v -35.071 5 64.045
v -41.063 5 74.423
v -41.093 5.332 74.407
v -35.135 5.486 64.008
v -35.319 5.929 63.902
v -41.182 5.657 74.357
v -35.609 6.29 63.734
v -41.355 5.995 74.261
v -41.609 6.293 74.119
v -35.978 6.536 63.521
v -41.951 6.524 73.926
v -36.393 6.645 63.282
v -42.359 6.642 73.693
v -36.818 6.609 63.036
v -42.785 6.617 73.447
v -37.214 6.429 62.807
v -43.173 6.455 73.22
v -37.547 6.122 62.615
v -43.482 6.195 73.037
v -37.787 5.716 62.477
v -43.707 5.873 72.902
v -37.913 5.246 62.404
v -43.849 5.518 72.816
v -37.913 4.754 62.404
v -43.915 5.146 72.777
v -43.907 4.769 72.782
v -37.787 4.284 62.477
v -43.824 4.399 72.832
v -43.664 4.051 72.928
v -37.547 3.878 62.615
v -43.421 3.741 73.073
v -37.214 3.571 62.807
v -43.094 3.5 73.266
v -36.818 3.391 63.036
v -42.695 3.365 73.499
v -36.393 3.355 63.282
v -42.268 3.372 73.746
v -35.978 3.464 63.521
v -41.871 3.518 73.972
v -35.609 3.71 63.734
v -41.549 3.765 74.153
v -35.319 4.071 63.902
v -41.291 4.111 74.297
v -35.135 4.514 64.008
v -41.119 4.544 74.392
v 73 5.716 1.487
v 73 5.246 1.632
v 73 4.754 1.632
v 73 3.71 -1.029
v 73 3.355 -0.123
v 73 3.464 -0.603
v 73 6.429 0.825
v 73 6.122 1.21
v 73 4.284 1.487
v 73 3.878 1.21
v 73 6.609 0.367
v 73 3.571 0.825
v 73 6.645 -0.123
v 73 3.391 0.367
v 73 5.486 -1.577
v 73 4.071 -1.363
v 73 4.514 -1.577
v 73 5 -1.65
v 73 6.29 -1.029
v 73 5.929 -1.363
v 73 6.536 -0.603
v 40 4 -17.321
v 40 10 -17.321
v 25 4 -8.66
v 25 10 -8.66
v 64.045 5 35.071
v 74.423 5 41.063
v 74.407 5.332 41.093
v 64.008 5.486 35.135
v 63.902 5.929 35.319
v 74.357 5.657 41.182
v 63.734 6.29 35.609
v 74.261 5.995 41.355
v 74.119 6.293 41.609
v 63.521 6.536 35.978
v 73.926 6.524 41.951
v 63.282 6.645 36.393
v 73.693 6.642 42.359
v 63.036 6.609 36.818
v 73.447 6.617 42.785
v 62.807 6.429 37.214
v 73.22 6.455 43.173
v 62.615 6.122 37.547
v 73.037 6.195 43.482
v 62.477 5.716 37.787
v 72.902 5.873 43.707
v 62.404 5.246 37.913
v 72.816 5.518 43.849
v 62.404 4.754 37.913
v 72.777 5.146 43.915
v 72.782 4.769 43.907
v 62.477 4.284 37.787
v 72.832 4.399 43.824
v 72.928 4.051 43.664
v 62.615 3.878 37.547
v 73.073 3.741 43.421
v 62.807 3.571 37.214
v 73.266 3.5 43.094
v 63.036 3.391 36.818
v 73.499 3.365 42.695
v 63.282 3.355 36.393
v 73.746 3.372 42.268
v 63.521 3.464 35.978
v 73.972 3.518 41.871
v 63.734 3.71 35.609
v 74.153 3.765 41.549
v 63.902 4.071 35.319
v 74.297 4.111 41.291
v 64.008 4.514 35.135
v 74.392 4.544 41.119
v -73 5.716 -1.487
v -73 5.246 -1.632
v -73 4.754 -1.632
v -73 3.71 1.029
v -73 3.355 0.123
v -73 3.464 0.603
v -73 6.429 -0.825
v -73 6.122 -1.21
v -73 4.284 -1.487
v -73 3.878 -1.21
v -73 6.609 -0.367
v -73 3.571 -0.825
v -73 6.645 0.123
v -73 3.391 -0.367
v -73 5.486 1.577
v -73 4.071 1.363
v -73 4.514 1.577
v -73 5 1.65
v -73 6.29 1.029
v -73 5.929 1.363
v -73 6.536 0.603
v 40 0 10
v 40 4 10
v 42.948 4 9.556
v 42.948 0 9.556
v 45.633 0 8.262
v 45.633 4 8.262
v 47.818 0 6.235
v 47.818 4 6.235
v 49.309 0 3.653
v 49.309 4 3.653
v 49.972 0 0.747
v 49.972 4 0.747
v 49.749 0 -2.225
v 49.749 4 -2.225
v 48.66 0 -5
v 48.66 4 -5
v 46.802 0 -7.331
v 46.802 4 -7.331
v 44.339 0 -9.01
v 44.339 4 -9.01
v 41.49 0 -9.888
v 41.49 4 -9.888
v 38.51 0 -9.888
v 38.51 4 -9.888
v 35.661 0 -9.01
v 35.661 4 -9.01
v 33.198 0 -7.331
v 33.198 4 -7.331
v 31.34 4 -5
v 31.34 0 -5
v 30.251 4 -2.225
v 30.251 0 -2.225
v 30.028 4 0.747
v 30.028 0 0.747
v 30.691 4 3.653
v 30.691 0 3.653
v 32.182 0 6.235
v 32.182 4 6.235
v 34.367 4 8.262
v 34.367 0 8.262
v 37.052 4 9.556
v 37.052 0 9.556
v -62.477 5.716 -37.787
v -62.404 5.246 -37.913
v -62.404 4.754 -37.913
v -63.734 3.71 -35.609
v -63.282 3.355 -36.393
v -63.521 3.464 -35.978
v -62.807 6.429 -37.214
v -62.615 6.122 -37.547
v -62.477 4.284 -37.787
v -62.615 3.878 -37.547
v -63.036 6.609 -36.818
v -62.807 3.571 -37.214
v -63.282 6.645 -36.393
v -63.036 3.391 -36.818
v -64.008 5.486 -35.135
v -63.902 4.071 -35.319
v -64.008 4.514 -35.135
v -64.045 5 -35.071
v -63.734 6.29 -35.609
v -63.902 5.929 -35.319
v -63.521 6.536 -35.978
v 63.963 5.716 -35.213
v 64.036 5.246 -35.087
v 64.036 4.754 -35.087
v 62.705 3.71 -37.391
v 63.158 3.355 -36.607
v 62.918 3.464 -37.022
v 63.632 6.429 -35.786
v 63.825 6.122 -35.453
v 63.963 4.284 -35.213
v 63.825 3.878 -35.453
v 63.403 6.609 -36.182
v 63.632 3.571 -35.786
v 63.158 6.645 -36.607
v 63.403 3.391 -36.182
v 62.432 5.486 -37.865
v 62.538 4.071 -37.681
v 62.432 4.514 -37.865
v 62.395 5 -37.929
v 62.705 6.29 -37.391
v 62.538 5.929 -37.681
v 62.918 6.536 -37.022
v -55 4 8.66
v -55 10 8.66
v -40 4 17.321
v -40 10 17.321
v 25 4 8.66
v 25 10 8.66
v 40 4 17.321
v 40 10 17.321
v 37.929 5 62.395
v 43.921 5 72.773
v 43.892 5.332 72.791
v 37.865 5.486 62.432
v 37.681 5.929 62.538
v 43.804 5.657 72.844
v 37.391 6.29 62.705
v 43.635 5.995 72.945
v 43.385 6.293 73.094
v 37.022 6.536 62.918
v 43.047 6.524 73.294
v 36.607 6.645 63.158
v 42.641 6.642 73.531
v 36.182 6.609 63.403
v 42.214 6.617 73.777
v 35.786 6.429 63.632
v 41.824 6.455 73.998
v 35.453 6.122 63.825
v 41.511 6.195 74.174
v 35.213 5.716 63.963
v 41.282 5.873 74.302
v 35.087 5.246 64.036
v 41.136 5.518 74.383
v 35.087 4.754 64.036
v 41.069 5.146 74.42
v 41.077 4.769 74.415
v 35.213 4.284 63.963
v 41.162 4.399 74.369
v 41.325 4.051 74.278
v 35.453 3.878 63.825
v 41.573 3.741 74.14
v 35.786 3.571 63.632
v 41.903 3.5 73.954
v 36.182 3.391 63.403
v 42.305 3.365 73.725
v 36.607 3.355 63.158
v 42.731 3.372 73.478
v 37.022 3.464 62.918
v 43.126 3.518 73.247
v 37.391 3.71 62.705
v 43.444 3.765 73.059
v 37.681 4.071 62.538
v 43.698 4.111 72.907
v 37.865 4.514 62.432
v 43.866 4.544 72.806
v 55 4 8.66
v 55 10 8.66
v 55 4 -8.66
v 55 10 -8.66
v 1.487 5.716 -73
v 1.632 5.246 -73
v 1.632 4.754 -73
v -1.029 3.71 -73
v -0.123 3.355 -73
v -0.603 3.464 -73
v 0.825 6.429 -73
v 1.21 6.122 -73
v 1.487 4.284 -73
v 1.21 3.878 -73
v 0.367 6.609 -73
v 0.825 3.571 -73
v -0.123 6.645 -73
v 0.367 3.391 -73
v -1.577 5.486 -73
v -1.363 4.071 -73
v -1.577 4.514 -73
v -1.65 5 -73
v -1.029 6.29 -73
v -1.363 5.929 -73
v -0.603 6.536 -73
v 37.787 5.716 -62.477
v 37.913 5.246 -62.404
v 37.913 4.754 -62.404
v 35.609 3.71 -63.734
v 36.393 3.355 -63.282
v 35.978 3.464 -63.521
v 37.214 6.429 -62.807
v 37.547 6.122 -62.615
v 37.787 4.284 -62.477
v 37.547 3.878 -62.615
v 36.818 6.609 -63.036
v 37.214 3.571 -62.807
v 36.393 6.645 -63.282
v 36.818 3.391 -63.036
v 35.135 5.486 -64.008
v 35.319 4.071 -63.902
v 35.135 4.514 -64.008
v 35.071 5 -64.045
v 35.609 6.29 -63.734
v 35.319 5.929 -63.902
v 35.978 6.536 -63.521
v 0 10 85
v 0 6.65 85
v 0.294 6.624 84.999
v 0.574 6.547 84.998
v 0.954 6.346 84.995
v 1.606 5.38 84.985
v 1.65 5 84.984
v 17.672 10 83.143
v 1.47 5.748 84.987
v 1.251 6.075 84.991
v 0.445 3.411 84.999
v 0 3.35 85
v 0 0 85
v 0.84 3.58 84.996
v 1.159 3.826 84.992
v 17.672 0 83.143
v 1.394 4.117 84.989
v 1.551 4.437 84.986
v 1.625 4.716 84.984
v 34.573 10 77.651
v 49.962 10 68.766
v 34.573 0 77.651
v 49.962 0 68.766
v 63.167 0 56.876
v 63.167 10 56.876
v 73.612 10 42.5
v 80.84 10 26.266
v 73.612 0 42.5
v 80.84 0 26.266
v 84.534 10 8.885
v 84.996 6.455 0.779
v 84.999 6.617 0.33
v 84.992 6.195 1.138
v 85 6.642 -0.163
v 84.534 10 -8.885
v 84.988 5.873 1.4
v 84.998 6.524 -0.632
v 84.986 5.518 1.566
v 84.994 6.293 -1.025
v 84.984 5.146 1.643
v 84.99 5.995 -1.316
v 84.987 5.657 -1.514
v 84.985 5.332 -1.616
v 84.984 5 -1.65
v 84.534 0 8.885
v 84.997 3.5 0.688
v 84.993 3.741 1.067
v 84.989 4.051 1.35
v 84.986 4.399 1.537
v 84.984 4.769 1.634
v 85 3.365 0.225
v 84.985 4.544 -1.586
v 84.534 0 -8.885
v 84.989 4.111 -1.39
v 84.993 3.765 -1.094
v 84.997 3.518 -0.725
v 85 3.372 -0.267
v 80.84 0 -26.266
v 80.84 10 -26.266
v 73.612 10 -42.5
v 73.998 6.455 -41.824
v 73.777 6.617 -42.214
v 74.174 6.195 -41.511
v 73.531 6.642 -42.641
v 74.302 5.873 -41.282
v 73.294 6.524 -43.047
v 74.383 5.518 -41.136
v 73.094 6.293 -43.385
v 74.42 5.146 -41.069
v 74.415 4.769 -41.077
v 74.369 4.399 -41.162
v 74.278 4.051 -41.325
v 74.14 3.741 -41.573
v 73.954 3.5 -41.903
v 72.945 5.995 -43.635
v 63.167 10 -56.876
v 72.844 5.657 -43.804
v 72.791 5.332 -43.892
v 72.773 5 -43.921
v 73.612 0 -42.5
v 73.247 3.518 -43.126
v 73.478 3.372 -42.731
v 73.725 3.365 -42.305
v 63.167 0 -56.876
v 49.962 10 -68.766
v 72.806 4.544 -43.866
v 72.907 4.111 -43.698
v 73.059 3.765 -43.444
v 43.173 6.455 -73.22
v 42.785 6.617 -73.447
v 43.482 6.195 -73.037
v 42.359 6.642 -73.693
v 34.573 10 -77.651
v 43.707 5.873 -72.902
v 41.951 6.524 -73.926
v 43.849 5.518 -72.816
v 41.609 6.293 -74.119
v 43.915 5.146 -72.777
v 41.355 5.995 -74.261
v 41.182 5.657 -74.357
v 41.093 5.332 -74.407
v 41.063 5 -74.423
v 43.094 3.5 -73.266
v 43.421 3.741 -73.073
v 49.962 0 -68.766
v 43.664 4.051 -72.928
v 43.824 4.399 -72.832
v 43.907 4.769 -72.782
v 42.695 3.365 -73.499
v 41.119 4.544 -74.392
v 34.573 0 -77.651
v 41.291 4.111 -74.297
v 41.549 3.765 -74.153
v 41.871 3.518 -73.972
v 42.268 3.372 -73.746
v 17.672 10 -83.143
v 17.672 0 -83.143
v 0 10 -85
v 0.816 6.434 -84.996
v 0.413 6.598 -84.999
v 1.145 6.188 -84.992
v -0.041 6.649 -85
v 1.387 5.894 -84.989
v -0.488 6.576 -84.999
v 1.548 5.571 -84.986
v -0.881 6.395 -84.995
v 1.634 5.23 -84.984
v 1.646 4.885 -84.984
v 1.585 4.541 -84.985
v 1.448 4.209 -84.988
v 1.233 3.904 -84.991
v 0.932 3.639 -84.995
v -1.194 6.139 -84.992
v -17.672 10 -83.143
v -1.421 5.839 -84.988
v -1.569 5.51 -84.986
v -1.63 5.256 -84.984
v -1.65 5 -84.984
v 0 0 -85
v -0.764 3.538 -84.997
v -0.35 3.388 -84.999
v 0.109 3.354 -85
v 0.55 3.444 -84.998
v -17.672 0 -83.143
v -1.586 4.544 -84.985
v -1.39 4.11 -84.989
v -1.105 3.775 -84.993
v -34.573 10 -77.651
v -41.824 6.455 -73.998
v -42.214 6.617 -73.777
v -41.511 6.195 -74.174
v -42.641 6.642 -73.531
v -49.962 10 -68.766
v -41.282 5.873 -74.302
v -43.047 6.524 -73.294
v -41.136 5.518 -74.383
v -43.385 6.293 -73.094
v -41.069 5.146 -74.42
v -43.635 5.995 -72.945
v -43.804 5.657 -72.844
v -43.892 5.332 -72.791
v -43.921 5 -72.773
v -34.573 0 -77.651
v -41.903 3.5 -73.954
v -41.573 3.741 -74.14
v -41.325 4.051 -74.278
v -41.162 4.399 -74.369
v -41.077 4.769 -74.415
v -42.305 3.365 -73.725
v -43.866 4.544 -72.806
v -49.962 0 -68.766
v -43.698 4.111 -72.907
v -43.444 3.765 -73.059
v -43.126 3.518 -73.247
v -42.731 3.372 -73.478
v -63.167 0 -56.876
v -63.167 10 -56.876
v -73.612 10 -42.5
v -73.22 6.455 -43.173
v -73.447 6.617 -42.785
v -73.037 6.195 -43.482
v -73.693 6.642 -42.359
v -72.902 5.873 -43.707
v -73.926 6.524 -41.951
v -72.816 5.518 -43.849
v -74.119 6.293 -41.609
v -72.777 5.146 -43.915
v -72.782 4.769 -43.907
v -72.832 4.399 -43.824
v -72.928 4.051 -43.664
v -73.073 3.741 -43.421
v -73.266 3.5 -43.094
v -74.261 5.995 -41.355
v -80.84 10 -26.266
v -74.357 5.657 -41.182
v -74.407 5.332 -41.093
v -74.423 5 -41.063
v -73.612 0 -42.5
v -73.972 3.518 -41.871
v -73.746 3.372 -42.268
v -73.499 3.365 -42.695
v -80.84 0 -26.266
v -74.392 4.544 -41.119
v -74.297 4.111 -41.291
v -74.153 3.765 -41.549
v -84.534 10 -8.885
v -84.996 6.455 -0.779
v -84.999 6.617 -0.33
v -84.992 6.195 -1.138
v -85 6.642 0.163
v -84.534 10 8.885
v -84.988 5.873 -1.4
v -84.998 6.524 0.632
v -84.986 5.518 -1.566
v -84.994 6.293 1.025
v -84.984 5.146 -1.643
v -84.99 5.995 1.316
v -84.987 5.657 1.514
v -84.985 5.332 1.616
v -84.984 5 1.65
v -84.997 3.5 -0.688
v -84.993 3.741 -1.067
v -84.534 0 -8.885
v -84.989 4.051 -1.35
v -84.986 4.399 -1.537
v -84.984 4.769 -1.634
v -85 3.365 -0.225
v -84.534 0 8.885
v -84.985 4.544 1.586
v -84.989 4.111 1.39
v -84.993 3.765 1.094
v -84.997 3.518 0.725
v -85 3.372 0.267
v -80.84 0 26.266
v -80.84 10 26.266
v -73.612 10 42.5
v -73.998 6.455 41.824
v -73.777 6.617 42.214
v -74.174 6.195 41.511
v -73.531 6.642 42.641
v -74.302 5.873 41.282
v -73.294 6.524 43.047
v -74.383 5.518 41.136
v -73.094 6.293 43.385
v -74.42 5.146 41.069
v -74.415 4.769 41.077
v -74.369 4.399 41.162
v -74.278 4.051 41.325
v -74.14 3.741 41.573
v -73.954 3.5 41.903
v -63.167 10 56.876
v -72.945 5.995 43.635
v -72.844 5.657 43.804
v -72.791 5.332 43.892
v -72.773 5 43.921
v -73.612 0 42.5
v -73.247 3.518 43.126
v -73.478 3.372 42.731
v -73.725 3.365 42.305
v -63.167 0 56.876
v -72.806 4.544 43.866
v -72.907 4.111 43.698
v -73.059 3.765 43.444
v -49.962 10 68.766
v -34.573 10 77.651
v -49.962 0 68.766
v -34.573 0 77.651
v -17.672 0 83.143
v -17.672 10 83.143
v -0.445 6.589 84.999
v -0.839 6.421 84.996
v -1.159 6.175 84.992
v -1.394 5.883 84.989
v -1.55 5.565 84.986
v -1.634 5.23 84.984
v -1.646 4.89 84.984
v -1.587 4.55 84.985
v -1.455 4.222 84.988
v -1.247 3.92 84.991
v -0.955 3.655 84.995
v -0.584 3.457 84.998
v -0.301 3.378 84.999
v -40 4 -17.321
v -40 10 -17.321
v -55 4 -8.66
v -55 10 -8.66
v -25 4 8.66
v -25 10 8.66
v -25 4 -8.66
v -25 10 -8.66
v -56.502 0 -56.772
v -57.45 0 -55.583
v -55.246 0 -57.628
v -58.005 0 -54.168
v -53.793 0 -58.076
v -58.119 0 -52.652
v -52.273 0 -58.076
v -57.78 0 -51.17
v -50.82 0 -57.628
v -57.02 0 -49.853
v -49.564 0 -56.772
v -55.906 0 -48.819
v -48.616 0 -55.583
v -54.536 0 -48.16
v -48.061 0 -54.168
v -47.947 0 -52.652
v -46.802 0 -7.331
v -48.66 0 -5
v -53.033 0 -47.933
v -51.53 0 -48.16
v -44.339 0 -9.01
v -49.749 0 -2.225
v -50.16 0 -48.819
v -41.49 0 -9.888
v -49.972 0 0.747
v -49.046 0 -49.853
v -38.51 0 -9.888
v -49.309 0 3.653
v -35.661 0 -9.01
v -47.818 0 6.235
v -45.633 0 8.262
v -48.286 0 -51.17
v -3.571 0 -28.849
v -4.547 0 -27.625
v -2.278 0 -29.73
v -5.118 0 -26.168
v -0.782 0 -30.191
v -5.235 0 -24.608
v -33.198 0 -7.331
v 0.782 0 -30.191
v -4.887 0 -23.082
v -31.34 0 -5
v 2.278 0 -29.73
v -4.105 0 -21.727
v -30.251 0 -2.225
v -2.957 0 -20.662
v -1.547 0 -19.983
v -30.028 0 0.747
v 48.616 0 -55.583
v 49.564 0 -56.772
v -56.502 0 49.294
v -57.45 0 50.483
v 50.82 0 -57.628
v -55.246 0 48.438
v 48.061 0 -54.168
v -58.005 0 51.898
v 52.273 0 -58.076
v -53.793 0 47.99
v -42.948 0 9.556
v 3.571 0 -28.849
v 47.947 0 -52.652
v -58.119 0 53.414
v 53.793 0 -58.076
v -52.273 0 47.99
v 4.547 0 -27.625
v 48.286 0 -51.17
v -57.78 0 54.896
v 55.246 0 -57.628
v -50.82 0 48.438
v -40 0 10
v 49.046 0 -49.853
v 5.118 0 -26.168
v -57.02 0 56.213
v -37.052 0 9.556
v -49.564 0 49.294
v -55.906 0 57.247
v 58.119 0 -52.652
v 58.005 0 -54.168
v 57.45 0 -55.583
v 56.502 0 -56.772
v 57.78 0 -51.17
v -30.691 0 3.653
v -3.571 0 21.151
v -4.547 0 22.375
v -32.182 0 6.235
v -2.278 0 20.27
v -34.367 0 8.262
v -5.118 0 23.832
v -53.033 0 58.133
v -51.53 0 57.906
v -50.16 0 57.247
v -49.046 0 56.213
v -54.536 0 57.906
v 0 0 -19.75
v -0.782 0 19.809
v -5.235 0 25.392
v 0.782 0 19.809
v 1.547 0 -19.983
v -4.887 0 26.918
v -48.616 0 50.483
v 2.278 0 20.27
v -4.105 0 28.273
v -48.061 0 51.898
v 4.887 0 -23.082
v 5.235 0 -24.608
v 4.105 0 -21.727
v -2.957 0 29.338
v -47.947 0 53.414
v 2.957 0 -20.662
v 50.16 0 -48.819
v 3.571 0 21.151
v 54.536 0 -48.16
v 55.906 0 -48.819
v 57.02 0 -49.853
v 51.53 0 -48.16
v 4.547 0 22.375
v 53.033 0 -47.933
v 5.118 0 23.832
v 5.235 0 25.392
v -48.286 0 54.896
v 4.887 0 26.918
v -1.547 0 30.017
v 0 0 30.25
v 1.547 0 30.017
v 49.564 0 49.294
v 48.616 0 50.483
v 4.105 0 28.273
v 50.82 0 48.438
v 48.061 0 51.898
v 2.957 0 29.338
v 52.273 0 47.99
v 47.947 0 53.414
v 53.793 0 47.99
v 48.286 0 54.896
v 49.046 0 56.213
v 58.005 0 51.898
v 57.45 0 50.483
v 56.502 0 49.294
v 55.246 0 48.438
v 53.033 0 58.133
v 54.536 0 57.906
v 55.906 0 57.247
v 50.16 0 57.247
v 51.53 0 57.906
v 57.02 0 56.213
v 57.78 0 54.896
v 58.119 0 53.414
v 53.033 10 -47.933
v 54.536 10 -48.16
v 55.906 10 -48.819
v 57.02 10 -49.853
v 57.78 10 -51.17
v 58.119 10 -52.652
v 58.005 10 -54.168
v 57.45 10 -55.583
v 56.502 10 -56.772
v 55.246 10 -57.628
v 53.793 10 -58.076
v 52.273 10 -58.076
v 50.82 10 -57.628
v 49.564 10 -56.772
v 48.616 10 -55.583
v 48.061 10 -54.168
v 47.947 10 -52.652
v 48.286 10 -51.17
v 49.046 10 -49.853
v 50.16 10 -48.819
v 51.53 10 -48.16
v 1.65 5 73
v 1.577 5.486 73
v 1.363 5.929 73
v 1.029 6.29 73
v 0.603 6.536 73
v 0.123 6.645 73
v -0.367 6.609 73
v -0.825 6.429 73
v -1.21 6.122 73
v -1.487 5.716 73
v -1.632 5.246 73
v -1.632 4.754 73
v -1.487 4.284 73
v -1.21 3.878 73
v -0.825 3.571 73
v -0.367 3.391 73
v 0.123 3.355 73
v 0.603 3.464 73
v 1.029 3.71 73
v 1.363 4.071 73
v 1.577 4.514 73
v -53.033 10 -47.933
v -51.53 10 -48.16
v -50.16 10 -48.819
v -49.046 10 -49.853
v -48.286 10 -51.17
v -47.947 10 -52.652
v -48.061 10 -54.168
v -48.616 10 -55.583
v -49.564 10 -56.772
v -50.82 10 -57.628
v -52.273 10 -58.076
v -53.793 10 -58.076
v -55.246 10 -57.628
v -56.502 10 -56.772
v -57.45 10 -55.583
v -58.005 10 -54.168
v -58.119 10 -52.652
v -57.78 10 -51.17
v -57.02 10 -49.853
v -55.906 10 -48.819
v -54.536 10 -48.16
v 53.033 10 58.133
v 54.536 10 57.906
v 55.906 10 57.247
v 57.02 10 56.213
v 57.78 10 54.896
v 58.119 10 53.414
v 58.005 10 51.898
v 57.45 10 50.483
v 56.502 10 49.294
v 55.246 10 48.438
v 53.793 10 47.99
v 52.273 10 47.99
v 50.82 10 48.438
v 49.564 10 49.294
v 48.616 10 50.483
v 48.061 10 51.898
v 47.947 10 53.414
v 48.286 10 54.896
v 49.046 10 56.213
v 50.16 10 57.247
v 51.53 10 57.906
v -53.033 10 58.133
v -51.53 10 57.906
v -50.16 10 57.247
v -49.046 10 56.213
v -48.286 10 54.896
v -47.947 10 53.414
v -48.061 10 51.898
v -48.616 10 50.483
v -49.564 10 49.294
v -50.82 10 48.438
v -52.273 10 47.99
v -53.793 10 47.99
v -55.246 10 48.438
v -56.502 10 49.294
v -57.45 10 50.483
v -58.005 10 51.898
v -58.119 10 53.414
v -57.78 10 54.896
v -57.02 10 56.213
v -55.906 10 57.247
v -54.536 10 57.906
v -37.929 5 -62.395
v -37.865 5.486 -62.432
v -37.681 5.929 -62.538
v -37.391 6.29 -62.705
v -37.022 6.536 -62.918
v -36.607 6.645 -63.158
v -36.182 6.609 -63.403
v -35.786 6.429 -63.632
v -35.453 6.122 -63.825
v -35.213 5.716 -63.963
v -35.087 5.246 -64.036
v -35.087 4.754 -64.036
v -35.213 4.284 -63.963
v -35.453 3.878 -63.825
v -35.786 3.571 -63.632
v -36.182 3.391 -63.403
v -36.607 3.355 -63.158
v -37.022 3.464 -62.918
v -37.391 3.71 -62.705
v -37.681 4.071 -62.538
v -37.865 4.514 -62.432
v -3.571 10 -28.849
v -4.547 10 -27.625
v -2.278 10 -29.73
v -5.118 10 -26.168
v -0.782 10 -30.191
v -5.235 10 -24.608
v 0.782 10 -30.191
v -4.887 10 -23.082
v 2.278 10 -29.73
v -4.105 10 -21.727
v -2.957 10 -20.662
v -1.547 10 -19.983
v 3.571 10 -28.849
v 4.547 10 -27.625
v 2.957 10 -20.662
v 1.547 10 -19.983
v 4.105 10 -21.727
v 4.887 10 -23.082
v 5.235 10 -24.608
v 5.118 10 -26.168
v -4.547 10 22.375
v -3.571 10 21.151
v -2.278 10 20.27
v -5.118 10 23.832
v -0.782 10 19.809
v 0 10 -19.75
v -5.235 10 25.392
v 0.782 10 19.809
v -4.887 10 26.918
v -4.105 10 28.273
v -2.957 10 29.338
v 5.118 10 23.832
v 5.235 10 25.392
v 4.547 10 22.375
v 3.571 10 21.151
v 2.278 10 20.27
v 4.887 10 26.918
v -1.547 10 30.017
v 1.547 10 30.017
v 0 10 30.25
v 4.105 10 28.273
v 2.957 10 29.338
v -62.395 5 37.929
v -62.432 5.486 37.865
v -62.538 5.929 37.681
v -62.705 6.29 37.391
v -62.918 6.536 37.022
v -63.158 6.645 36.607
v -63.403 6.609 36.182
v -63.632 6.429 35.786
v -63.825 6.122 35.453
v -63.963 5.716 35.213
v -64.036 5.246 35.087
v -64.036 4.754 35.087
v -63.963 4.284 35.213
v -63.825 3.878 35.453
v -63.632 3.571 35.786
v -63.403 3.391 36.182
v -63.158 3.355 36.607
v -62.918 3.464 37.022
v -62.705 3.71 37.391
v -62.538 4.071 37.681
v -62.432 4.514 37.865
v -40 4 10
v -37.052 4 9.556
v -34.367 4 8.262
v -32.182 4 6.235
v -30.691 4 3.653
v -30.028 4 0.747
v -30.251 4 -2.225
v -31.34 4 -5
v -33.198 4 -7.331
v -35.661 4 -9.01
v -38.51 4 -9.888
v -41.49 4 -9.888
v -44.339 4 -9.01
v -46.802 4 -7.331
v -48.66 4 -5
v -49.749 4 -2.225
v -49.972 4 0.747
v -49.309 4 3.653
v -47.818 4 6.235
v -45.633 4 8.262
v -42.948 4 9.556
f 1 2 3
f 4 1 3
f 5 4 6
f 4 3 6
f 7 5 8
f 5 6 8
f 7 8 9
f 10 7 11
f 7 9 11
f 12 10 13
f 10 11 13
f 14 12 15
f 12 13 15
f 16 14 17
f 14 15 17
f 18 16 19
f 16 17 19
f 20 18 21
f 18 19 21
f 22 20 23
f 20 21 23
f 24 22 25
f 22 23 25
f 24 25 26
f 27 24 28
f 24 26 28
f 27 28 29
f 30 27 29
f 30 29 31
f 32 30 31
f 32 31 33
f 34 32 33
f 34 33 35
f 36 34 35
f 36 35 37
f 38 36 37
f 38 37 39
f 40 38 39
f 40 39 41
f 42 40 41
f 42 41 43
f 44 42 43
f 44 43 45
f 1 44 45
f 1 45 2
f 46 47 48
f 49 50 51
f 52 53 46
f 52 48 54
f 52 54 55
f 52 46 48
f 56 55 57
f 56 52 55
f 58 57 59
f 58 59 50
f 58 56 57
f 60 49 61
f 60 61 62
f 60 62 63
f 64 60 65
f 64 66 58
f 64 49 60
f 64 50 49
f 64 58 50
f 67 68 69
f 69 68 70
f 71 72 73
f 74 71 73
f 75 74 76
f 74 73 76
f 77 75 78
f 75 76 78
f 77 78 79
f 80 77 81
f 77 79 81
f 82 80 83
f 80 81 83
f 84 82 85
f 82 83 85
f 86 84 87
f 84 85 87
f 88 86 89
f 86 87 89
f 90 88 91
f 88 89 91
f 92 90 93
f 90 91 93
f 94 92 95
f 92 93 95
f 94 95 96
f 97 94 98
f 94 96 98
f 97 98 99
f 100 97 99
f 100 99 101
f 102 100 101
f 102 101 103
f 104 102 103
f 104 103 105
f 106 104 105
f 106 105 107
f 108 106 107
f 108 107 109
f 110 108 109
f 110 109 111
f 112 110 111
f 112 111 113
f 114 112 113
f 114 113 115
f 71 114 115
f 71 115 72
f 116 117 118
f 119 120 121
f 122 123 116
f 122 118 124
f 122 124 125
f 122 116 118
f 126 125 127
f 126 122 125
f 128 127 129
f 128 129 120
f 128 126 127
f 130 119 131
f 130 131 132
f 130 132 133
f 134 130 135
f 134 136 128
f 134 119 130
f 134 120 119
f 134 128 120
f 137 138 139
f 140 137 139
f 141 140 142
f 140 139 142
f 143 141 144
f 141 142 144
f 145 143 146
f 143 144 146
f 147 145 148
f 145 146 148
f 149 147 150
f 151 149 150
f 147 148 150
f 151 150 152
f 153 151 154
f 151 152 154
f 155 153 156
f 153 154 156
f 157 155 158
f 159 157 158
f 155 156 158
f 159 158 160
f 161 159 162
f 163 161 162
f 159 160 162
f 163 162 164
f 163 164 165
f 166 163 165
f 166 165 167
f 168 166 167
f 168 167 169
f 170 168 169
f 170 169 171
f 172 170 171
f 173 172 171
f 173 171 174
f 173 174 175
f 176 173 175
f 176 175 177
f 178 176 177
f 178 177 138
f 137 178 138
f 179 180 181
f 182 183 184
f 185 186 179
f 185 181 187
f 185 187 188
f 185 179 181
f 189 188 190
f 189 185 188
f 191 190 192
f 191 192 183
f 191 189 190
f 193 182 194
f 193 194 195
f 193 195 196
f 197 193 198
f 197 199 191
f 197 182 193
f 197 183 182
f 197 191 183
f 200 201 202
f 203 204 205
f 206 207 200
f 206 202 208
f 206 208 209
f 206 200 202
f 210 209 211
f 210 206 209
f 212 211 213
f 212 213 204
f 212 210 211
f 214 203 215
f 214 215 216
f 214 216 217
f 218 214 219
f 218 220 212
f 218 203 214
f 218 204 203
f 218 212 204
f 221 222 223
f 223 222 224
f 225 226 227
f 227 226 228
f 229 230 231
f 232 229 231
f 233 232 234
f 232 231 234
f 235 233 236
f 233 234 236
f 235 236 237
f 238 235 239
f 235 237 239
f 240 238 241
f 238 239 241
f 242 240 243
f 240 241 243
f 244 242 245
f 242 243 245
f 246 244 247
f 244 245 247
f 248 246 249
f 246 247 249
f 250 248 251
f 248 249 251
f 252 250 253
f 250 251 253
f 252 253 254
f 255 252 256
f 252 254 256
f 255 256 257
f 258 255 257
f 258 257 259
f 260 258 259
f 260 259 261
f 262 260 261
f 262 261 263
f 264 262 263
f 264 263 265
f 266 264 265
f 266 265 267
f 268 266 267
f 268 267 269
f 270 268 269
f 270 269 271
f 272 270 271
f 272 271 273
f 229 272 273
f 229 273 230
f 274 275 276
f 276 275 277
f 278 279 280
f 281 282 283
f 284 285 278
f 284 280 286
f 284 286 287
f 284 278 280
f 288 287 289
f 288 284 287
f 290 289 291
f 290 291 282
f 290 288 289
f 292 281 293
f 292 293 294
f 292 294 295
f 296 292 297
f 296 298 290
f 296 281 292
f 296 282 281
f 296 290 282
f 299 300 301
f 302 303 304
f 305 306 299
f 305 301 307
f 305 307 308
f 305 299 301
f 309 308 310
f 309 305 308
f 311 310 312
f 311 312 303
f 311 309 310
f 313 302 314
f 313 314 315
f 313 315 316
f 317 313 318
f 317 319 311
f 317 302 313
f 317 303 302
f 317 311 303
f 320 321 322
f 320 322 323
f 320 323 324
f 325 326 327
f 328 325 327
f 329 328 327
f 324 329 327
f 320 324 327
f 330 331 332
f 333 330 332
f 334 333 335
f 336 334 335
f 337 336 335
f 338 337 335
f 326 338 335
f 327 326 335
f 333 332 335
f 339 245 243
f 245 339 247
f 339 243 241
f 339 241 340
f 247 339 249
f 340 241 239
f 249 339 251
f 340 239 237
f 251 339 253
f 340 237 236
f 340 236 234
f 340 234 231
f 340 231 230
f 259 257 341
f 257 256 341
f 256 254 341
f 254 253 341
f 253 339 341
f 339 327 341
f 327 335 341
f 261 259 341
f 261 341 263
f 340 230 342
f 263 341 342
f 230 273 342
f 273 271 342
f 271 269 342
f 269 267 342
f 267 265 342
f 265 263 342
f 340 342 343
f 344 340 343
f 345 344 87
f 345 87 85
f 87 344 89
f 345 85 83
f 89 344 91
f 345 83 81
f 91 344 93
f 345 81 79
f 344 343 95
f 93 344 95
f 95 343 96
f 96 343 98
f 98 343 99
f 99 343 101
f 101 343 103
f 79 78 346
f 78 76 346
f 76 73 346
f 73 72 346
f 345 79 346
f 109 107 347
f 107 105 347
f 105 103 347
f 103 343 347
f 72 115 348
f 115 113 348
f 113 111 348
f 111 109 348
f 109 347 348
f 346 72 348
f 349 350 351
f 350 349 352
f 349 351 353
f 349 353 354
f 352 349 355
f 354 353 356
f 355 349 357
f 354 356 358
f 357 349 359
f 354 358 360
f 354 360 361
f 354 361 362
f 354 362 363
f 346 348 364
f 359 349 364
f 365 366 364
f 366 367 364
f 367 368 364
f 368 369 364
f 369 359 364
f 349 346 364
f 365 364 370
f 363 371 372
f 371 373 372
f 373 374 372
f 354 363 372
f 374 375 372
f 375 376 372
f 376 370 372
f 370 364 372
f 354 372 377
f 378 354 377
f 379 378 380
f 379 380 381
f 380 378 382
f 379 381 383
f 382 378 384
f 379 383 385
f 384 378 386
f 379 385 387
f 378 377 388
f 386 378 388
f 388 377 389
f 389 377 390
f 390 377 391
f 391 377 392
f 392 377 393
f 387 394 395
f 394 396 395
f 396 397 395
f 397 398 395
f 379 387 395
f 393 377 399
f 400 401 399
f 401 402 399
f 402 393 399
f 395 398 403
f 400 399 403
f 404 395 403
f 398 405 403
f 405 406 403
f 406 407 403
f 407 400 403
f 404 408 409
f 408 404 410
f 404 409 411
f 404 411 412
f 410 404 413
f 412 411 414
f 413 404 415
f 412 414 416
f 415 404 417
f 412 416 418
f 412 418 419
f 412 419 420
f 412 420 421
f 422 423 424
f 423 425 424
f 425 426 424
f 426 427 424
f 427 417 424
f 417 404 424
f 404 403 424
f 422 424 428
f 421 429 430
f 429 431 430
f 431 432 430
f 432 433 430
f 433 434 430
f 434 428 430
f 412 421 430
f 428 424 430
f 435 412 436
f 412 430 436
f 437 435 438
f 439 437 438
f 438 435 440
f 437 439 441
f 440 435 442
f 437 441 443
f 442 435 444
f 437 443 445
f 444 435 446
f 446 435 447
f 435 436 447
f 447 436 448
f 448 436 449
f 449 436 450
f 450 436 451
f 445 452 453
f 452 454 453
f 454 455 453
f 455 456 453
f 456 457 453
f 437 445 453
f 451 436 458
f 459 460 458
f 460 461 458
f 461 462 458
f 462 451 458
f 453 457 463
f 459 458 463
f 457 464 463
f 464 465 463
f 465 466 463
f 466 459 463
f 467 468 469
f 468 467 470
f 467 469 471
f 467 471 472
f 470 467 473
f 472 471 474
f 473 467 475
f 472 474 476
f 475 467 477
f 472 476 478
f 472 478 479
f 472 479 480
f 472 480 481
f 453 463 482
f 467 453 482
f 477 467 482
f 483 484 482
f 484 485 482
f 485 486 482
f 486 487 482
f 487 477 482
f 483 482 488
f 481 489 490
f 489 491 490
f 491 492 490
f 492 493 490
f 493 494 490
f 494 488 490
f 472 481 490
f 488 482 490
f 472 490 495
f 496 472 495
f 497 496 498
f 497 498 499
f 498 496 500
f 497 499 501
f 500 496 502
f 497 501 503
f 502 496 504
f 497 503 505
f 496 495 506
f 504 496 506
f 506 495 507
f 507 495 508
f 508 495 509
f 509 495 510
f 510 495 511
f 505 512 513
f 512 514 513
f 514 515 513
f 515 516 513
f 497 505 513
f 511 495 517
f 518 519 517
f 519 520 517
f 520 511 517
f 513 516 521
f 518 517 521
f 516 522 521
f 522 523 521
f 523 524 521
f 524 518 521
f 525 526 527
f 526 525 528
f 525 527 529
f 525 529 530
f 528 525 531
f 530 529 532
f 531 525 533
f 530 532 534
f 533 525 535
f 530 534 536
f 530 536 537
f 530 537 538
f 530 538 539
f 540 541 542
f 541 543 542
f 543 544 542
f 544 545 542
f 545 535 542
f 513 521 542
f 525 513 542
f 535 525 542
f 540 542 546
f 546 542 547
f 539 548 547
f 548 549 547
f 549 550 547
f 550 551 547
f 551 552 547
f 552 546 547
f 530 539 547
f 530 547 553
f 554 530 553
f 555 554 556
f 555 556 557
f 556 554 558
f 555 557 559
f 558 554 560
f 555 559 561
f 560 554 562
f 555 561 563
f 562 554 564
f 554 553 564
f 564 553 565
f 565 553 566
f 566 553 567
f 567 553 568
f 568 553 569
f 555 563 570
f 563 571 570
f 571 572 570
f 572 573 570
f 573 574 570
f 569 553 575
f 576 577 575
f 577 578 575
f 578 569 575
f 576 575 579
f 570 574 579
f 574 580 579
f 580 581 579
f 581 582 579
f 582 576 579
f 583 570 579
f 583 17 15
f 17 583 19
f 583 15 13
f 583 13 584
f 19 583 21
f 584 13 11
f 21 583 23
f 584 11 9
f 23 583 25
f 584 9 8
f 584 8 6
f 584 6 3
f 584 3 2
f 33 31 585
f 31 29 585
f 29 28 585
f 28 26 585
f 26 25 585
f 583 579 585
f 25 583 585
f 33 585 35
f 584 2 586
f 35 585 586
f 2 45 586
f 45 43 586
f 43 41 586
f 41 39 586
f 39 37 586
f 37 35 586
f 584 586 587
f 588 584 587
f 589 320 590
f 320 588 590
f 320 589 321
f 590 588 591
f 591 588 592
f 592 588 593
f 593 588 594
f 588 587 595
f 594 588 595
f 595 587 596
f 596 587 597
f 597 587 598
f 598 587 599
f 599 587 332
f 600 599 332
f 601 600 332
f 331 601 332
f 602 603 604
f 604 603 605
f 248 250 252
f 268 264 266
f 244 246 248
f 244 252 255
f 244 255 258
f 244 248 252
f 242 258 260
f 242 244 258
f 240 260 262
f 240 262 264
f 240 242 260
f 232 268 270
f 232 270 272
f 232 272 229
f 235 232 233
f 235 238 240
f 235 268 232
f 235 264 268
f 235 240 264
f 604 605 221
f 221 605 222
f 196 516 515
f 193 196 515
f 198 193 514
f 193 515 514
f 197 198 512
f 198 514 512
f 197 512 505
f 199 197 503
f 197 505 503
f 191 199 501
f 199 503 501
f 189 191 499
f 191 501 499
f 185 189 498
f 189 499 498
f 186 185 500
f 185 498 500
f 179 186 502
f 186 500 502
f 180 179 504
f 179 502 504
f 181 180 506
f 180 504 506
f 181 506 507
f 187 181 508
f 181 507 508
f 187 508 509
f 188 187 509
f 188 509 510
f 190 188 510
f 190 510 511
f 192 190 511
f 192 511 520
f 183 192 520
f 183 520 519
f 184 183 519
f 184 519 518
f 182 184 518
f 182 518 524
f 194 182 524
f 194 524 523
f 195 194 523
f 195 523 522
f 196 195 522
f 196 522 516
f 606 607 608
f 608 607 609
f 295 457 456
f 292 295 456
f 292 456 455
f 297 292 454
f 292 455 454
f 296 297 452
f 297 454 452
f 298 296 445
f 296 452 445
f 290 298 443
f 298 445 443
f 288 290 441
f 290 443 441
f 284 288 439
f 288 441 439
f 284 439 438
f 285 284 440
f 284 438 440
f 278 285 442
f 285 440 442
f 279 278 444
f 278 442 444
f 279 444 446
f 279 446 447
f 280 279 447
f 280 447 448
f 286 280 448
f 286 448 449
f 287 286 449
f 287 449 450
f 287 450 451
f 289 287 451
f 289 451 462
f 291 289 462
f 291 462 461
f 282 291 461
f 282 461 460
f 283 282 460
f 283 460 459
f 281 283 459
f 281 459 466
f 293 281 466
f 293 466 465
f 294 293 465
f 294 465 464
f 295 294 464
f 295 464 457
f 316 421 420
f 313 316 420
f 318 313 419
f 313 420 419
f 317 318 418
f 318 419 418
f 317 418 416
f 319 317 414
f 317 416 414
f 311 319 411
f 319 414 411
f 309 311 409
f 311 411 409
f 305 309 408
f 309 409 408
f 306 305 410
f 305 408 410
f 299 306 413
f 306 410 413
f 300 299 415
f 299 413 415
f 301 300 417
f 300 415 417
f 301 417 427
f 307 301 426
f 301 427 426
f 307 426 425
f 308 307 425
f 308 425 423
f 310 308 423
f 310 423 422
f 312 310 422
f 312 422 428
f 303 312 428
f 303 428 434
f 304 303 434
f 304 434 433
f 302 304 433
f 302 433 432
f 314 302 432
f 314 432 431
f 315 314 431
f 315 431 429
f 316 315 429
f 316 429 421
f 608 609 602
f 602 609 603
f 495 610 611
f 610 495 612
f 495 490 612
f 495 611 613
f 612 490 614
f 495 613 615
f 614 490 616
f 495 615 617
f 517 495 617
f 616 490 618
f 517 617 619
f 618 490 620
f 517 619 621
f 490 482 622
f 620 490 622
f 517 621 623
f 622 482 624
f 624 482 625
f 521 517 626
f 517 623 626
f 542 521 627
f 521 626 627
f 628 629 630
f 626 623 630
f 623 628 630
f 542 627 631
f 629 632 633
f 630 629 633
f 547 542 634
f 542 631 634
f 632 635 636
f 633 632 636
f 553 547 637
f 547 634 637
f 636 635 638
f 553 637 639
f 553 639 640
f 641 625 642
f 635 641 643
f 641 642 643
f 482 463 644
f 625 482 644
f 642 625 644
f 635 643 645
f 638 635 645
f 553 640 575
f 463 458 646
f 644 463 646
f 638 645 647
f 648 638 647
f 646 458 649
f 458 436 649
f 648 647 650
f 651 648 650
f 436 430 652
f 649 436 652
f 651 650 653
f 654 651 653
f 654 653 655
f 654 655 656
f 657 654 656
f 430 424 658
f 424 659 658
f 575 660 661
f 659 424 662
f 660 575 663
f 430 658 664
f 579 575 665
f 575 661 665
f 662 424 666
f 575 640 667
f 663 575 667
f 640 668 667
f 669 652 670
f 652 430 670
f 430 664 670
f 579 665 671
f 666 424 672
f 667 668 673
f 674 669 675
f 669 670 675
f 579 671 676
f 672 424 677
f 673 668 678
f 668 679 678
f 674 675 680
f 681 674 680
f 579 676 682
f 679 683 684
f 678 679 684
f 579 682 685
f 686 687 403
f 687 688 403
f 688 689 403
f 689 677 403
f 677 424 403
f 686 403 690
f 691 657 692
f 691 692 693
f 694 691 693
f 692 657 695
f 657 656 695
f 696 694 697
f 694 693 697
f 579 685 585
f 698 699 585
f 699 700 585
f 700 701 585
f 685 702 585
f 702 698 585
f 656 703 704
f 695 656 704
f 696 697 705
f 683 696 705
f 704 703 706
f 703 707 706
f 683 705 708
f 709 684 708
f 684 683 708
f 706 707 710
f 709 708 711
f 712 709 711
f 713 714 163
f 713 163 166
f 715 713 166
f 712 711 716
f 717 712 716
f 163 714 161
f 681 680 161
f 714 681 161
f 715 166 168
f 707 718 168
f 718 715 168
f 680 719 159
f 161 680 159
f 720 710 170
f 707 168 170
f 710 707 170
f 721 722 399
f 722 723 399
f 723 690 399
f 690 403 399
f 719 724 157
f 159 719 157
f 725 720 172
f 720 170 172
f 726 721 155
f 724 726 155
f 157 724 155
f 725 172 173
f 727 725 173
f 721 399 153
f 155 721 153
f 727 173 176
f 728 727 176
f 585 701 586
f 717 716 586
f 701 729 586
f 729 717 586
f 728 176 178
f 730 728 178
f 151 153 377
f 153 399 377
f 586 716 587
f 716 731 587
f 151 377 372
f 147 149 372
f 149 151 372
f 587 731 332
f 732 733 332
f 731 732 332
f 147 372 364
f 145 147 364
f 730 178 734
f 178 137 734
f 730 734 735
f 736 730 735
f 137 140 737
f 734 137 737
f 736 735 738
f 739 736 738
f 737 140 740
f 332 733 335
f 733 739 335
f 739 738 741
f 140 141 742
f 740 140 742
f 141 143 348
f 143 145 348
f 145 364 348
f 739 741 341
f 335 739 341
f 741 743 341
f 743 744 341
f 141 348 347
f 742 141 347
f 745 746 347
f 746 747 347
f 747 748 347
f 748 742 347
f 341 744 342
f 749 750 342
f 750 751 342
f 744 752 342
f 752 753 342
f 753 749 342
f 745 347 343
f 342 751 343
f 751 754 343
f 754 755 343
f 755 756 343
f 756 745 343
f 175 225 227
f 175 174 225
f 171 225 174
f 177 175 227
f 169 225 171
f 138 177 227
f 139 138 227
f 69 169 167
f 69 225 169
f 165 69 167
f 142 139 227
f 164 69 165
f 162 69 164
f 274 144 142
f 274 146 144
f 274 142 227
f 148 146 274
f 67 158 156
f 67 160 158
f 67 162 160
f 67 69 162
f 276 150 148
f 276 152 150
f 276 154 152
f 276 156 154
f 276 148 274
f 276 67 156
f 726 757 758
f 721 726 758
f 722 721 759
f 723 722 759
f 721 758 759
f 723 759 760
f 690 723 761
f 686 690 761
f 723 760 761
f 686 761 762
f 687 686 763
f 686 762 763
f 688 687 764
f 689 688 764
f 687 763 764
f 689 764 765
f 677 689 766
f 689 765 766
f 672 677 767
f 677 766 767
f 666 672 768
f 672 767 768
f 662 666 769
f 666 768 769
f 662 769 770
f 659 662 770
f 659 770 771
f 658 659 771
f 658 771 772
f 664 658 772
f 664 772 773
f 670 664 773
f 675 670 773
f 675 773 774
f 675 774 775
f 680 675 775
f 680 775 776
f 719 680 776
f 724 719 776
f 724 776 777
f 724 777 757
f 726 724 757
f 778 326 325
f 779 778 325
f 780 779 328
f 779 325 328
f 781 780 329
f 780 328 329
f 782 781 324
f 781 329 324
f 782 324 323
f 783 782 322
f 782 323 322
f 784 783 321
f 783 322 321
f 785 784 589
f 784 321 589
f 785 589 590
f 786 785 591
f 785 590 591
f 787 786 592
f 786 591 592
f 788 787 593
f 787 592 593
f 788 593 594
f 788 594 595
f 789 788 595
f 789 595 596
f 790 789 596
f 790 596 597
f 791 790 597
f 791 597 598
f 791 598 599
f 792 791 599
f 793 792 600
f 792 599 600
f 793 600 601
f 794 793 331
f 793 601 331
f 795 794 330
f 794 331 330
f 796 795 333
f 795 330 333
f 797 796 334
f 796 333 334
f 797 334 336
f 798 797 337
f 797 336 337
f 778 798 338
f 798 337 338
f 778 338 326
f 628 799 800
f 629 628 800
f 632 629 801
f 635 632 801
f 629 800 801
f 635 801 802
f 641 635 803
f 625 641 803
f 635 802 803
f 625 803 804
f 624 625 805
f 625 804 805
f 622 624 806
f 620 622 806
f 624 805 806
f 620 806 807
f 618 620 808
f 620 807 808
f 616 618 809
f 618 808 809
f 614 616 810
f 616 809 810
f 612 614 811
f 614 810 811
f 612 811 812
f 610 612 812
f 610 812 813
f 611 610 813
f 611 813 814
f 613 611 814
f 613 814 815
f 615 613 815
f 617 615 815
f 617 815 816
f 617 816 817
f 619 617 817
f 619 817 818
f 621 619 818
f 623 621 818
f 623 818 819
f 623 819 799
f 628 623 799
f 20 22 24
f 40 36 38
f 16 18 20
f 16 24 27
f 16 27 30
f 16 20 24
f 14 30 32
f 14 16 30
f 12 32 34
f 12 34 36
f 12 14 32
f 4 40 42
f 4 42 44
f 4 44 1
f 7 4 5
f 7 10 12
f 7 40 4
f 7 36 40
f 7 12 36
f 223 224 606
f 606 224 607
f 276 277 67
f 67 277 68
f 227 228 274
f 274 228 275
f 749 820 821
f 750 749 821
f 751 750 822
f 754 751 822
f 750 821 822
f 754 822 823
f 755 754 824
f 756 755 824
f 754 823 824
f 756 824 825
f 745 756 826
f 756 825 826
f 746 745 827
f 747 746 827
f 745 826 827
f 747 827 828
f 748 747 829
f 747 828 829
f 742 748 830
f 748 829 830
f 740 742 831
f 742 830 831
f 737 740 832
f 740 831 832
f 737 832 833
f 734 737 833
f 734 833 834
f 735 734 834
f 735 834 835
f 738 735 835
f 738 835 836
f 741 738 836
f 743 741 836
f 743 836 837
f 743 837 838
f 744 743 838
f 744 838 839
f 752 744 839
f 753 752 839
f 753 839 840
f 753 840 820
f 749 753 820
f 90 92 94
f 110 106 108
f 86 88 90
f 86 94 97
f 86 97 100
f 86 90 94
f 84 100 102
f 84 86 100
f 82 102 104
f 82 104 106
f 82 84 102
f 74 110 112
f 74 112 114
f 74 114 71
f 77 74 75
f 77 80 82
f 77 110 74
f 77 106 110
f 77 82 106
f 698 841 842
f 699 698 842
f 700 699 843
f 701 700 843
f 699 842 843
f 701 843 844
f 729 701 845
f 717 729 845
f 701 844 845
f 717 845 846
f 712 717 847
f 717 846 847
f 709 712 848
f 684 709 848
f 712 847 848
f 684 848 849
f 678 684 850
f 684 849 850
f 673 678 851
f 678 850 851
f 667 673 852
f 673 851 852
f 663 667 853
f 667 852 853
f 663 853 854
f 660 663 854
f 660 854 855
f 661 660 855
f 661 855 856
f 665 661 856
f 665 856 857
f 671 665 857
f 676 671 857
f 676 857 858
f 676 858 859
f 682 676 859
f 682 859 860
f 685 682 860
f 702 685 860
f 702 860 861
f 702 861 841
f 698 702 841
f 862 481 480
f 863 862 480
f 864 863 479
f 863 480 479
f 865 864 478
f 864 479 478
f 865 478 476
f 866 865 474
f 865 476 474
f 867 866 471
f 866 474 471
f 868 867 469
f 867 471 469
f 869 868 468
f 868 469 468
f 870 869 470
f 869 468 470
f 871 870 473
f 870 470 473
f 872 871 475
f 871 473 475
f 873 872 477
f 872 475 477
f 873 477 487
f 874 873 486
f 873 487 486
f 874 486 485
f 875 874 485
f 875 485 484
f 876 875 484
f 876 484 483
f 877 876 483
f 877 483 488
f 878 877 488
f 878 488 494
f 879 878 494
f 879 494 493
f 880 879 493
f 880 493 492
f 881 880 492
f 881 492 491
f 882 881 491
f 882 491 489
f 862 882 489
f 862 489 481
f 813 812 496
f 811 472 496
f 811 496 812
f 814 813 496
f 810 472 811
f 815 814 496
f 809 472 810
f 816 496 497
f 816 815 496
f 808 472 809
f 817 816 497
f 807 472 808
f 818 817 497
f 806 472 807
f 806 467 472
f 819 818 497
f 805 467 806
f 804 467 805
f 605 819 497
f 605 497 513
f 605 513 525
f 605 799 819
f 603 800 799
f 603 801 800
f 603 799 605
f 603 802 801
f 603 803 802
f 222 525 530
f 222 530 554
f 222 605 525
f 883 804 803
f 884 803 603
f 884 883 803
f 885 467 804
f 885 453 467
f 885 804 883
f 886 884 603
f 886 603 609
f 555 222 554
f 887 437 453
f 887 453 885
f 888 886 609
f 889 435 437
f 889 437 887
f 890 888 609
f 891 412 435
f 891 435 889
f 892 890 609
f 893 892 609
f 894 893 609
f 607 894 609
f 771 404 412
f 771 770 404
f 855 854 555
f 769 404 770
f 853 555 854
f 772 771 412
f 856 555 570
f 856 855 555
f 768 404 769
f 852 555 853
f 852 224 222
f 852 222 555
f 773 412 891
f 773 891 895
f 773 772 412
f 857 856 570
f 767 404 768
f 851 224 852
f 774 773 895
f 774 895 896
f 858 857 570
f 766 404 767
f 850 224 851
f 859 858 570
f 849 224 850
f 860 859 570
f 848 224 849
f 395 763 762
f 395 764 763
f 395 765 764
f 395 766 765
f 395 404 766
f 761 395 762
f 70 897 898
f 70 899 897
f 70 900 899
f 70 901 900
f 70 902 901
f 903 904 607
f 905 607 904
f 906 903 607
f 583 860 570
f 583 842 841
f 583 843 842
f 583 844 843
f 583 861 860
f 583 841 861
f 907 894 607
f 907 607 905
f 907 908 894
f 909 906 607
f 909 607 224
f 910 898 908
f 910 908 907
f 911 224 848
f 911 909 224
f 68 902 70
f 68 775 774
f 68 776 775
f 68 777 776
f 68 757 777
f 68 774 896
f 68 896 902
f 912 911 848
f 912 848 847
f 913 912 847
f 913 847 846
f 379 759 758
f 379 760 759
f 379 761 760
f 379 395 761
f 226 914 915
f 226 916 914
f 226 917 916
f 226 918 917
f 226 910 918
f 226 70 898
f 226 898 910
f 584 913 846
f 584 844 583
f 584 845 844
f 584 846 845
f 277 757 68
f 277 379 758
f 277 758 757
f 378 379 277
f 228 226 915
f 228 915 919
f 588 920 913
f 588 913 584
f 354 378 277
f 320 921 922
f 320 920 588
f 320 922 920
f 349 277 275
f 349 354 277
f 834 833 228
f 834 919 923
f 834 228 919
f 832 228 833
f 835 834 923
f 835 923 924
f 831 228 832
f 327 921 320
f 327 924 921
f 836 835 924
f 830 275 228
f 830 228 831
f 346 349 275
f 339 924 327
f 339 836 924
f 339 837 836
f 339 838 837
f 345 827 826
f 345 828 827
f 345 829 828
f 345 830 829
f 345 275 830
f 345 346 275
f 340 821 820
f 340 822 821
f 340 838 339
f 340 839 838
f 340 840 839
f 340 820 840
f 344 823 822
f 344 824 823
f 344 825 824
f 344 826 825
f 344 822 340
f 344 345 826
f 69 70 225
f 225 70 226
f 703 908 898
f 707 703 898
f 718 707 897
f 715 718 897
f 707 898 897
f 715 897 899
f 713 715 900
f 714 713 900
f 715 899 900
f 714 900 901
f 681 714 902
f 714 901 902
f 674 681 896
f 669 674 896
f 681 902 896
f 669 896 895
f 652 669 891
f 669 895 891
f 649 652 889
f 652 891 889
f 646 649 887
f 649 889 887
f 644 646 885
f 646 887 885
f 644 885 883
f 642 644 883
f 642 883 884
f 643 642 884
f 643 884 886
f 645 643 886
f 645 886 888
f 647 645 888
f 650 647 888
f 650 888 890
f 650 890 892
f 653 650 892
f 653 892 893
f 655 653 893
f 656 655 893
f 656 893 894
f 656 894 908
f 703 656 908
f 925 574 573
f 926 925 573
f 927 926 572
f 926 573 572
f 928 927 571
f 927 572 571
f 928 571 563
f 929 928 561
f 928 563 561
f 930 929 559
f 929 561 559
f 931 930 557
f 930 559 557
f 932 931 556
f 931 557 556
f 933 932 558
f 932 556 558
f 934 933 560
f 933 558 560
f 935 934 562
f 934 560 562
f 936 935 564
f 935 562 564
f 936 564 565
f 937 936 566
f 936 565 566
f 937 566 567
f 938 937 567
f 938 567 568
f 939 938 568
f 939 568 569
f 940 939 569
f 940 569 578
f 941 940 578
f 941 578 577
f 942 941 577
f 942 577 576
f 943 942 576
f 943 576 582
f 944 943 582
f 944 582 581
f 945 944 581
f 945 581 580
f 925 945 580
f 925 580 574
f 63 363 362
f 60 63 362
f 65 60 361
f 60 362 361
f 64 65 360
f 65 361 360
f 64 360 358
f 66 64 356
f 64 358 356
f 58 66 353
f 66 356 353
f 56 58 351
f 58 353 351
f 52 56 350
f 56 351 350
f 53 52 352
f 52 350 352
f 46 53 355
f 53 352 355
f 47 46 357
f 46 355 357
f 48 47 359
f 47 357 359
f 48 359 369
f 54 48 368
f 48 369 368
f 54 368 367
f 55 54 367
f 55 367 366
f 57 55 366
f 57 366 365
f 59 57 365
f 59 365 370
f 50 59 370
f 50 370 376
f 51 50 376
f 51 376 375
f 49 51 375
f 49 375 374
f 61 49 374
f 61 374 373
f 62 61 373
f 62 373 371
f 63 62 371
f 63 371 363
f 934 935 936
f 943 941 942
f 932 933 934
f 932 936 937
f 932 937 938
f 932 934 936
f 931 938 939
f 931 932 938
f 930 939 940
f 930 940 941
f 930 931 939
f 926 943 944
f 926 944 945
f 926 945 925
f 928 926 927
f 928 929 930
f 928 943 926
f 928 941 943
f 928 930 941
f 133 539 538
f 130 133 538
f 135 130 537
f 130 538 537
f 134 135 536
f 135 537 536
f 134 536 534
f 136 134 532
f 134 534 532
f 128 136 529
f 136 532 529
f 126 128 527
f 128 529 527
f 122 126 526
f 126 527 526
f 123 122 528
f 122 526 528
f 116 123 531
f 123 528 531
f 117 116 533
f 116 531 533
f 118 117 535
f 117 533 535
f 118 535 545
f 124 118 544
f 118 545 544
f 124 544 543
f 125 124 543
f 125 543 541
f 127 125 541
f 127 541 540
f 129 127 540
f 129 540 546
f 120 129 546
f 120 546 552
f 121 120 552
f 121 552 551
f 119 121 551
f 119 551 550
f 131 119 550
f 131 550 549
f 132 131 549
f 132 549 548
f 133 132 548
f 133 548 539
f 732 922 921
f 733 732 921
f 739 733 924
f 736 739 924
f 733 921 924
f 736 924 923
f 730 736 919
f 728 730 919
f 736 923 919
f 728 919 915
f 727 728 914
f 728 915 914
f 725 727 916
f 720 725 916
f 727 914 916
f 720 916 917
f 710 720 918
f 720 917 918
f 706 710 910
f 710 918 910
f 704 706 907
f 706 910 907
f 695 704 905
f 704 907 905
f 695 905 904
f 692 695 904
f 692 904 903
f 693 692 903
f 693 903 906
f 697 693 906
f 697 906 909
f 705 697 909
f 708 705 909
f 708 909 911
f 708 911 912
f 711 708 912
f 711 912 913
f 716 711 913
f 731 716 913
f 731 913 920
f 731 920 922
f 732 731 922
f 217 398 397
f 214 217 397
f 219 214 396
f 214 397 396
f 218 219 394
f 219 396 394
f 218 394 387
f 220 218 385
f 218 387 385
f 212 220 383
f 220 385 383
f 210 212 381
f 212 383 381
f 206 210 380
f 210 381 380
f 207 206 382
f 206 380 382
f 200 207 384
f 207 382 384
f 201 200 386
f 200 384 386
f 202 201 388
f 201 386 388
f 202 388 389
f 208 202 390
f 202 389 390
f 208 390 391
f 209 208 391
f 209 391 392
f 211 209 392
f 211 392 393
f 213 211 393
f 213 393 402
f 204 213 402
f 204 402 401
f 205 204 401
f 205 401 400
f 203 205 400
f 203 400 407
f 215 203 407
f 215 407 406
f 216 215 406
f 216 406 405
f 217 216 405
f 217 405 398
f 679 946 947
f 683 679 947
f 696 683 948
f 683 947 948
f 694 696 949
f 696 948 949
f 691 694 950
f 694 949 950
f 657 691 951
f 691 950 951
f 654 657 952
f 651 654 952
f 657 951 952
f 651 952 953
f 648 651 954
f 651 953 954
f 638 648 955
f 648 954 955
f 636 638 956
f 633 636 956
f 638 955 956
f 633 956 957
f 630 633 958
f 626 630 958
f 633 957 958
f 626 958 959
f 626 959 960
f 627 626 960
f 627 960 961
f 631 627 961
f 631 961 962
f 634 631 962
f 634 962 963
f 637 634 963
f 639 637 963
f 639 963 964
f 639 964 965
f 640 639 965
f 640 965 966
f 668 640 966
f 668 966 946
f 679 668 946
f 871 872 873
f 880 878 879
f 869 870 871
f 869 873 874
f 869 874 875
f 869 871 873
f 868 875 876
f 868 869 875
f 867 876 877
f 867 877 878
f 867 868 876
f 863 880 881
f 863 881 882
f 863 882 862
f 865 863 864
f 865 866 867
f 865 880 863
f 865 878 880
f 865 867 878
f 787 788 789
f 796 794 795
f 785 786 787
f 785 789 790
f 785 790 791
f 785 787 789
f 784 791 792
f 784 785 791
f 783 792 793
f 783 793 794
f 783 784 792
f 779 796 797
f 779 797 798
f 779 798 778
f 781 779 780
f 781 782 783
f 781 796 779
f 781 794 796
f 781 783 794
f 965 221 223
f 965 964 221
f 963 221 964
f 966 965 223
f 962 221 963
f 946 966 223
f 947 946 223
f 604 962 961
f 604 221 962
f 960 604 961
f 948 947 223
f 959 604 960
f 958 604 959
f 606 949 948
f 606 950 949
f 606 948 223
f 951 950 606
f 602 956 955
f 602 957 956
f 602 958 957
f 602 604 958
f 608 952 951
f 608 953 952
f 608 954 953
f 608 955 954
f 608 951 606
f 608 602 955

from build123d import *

# Parameters (mm, degrees)
SZKIC1_R                    = 85
DODANIE_WYCI_GNI_CIE1_DEPTH = 10
CUT_EXTRUDE1_REACH          = 122.623
SZKIC2_R                    = 10
SZKIC2_R_2                  = 5.25
SZKIC2_R_3                  = 5.1
CUT_EXTRUDE2_DEPTH          = 6
SKETCH2_R                   = 1.65
CUT_EXTRUDE3_DEPTH          = 12
CIRPATTERN1_COUNT           = 12


with BuildPart() as part:
    # Szkic1 → Dodanie-wyciągnięcie1 (new body)
    with BuildSketch(Plane(origin=(0, 0, 0), x_dir=(1, 0, 0), z_dir=(0, 1, 0))):
        with Locations(Location((0, 0, 0), (0, 0, 270))):
            Circle(SZKIC1_R)
    extrude(amount=DODANIE_WYCI_GNI_CIE1_DEPTH)

    # Szkic2 → Cut-Extrude1 (cut, up to next)
    with BuildSketch(Plane(origin=(0, 10, 0), x_dir=(1, 0, 0), z_dir=(0, 1, 0)), mode=Mode.PRIVATE) as cut_extrude1_sk1:
        with Locations(Location((-40, 0, 0), (0, 0, 270))):
            Circle(SZKIC2_R)
    cut_extrude1_tool1 = extrude(cut_extrude1_sk1.sketch, amount=-CUT_EXTRUDE1_REACH, mode=Mode.PRIVATE) & part.part
    # Szkic2 → Cut-Extrude1 (cut, up to next)
    with BuildSketch(Plane(origin=(0, 10, 0), x_dir=(1, 0, 0), z_dir=(0, 1, 0)), mode=Mode.PRIVATE) as cut_extrude1_sk2:
        with Locations(Location((0, 25, 0), (0, 0, 270))):
            Circle(SZKIC2_R_2)
    cut_extrude1_tool2 = extrude(cut_extrude1_sk2.sketch, amount=-CUT_EXTRUDE1_REACH, mode=Mode.PRIVATE) & part.part
    # Szkic2 → Cut-Extrude1 (cut, up to next)
    with BuildSketch(Plane(origin=(0, 10, 0), x_dir=(1, 0, 0), z_dir=(0, 1, 0)), mode=Mode.PRIVATE) as cut_extrude1_sk3:
        with Locations(Location((53.033008589, 53.033008589, 0), (0, 0, 270))):
            Circle(SZKIC2_R_3)
    cut_extrude1_tool3 = extrude(cut_extrude1_sk3.sketch, amount=-CUT_EXTRUDE1_REACH, mode=Mode.PRIVATE) & part.part
    # Szkic2 → Cut-Extrude1 (cut, up to next)
    with BuildSketch(Plane(origin=(0, 10, 0), x_dir=(1, 0, 0), z_dir=(0, 1, 0)), mode=Mode.PRIVATE) as cut_extrude1_sk4:
        with Locations(Location((53.033008589, -53.033008589, 0), (0, 0, 270))):
            Circle(SZKIC2_R_3)
    cut_extrude1_tool4 = extrude(cut_extrude1_sk4.sketch, amount=-CUT_EXTRUDE1_REACH, mode=Mode.PRIVATE) & part.part
    # Szkic2 → Cut-Extrude1 (cut, up to next)
    with BuildSketch(Plane(origin=(0, 10, 0), x_dir=(1, 0, 0), z_dir=(0, 1, 0)), mode=Mode.PRIVATE) as cut_extrude1_sk5:
        with Locations(Location((-53.033008589, -53.033008589, 0), (0, 0, 270))):
            Circle(SZKIC2_R_3)
    cut_extrude1_tool5 = extrude(cut_extrude1_sk5.sketch, amount=-CUT_EXTRUDE1_REACH, mode=Mode.PRIVATE) & part.part
    # Szkic2 → Cut-Extrude1 (cut, up to next)
    with BuildSketch(Plane(origin=(0, 10, 0), x_dir=(1, 0, 0), z_dir=(0, 1, 0)), mode=Mode.PRIVATE) as cut_extrude1_sk6:
        with Locations(Location((-53.033008589, 53.033008589, 0), (0, 0, 270))):
            Circle(SZKIC2_R_3)
    cut_extrude1_tool6 = extrude(cut_extrude1_sk6.sketch, amount=-CUT_EXTRUDE1_REACH, mode=Mode.PRIVATE) & part.part
    # Szkic2 → Cut-Extrude1 (cut, up to next)
    with BuildSketch(Plane(origin=(0, 10, 0), x_dir=(1, 0, 0), z_dir=(0, 1, 0)), mode=Mode.PRIVATE) as cut_extrude1_sk7:
        with Locations(Location((0, -25, 0), (0, 0, 270))):
            Circle(SZKIC2_R_2)
    cut_extrude1_tool7 = extrude(cut_extrude1_sk7.sketch, amount=-CUT_EXTRUDE1_REACH, mode=Mode.PRIVATE) & part.part
    # Szkic2 → Cut-Extrude1 (cut, up to next)
    with BuildSketch(Plane(origin=(0, 10, 0), x_dir=(1, 0, 0), z_dir=(0, 1, 0)), mode=Mode.PRIVATE) as cut_extrude1_sk8:
        with Locations(Location((40, 0, 0), (0, 0, 270))):
            Circle(SZKIC2_R)
    cut_extrude1_tool8 = extrude(cut_extrude1_sk8.sketch, amount=-CUT_EXTRUDE1_REACH, mode=Mode.PRIVATE) & part.part
    add(cut_extrude1_tool1.solids().sort_by_distance((-40, 10, 0))[0], mode=Mode.SUBTRACT)
    add(cut_extrude1_tool2.solids().sort_by_distance((0, 10, -25))[0], mode=Mode.SUBTRACT)
    add(cut_extrude1_tool3.solids().sort_by_distance((53.033009, 10, -53.033009))[0], mode=Mode.SUBTRACT)
    add(cut_extrude1_tool4.solids().sort_by_distance((53.033009, 10, 53.033009))[0], mode=Mode.SUBTRACT)
    add(cut_extrude1_tool5.solids().sort_by_distance((-53.033009, 10, 53.033009))[0], mode=Mode.SUBTRACT)
    add(cut_extrude1_tool6.solids().sort_by_distance((-53.033009, 10, -53.033009))[0], mode=Mode.SUBTRACT)
    add(cut_extrude1_tool7.solids().sort_by_distance((0, 10, 25))[0], mode=Mode.SUBTRACT)
    add(cut_extrude1_tool8.solids().sort_by_distance((40, 10, 0))[0], mode=Mode.SUBTRACT)

    # Sketch1 → Cut-Extrude2 (cut)
    with BuildSketch(Plane(origin=(0, 10, 0), x_dir=(1, 0, 0), z_dir=(0, 1, 0))):
        Polygon((-25, -8.660254038), (-25, 8.660254038), (-40, 17.320508076), (-55, 8.660254038), (-55, -8.660254038), (-40, -17.320508076), align=None)
        Polygon((25, -8.660254038), (40, -17.320508076), (55, -8.660254038), (55, 8.660254038), (40, 17.320508076), (25, 8.660254038), align=None)
    extrude(amount=-CUT_EXTRUDE2_DEPTH, mode=Mode.SUBTRACT)

    # Sketch2 → Cut-Extrude3 (cut)
    with BuildSketch(Plane.ZY.offset(85)):
        with Locations((0, 5)):
            Circle(SKETCH2_R)
    cut_extrude3 = extrude(amount=-CUT_EXTRUDE3_DEPTH, mode=Mode.SUBTRACT)

    # CirPattern1: Cut-Extrude3 ×12 about axis
    cirpattern1_axis = Axis((0, 0, 0), (0, 1, 0))
    for i in range(1, CIRPATTERN1_COUNT):
        add(cut_extrude3.rotate(cirpattern1_axis, i * 360 / CIRPATTERN1_COUNT), mode=Mode.SUBTRACT)


solid = part.part
